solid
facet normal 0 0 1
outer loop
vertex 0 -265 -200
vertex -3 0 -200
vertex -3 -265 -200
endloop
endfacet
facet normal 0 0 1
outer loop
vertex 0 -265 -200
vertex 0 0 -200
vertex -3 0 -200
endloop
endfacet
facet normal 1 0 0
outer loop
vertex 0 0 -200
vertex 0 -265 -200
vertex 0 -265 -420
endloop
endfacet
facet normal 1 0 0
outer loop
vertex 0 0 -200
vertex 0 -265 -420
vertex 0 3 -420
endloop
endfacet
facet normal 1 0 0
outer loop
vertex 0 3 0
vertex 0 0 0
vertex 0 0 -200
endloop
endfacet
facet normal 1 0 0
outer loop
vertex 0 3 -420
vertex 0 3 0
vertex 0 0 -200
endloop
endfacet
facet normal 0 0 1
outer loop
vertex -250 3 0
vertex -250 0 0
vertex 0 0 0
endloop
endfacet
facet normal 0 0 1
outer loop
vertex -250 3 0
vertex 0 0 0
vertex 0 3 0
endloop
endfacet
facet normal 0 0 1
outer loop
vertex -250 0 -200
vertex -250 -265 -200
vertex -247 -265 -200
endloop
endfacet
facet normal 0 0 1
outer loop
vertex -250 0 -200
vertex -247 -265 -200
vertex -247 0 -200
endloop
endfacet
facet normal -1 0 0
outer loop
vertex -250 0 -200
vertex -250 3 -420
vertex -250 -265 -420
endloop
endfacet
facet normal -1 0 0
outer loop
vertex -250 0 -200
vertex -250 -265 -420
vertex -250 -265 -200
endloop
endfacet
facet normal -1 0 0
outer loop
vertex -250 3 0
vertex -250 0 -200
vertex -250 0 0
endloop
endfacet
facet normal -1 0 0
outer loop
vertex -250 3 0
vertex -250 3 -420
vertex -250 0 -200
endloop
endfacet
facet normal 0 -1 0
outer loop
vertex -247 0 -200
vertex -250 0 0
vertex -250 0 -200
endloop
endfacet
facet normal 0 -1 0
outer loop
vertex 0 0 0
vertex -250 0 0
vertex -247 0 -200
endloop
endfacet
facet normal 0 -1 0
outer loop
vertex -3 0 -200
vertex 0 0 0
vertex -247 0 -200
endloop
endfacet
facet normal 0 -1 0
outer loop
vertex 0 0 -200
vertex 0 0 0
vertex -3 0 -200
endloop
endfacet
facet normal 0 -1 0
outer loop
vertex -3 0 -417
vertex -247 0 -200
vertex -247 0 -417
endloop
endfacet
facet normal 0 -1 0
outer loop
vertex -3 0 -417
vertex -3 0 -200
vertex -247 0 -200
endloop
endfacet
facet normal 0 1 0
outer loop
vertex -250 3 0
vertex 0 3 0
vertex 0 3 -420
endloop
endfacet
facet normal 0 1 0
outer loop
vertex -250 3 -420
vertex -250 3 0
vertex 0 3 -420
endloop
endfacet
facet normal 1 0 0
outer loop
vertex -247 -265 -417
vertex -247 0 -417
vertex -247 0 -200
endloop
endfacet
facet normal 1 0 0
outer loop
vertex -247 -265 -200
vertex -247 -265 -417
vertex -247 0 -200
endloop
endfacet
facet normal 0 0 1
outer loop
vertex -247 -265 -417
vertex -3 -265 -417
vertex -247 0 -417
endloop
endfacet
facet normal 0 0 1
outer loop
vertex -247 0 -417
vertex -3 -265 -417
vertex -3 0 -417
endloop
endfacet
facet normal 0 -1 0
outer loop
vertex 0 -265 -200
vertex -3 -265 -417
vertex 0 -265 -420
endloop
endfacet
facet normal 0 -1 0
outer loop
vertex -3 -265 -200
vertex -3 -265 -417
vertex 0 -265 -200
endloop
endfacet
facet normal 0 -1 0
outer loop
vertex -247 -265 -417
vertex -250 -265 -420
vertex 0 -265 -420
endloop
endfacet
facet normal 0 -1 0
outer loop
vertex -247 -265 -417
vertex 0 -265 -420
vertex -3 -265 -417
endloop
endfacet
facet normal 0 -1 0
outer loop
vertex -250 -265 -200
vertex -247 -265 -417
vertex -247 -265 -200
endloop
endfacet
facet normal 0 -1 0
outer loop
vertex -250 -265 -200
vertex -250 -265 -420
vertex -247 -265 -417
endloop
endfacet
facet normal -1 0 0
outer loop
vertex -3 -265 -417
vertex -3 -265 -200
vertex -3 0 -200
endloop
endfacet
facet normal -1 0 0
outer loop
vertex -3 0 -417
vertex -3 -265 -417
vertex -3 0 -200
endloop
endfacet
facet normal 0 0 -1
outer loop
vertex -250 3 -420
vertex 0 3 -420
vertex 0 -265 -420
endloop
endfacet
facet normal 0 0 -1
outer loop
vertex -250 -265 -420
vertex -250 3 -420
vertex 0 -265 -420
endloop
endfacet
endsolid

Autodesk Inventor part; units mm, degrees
ref_plane "YZ Plane" through (0, 0, 0) normal (1, 0, 0) x (0, 1, 0)
ref_plane "XZ Plane" through (0, 0, 0) normal (0, 1, 0) x (-1, 0, 0)
ref_plane "XY Plane" through (0, 0, 0) normal (0, 0, 1) x (1, 0, 0)
sketch "Sketch1" plane through (0, 0, 0) normal (1, 0, 0) x (0, 1, 0)
  line L0 (0, 0) -> (0, -200)
  line L1 (0, 0) -> (200, 0) construction
  line L2 (0, -200) -> (-240, -200)
  line L3 (-240, -420) -> (0, -420)
  line L4 (0, 0) -> (3, 0)
  line L5 (3, 0) -> (3, -420)
  line L6 (3, -420) -> (-1.1181, -420)
  line L7 (0, -200) -> (0, -420)
  line L8 (-240, -417) -> (0, -417)
  line L9 (-240, -417) -> (0, -417) construction
  line L10 (-240, -200) -> (-265, -200)
  line L11 (-265, -200) -> (-265, -420)
  line L12 (-265, -420) -> (-240, -420)
  line L13 (-240, -417) -> (-265, -417)
  dimension "d0" = 200
  dimension "d1" = 90
  dimension "d2" = 240
  dimension "d3" = 90
  dimension "d4" = 220
  dimension "d8" = 3
  dimension "d9" = 90
  dimension "d10" = 3
  dimension "d18" = 25
  dimension "d19" = 220
  dimension "d20" = 90
extrude "Extrusion4" add sketch "Sketch1" against normal blind 250 contours L4 L5 L6 L7 L0 | L7 L3 L12 L11 L13 L8
extrude "Extrusion5" add sketch "Sketch1" against normal blind 3 contours L7 L8 L13 L11 L10 L2
sketch "Sketch3" plane through (-250, 0, 0) normal (-1, 0, 0) x (0, 0, 1)
  line L0 (-417, -265) -> (-417, 0) projected
  line L1 (-200, -265) -> (-200, 0) projected
  line L2 (-417, 0) -> (-200, 0)
  line L3 (-417, -265) -> (-200, -265) projected
  line L4 (-200, 0) -> (-200, -265)
  line L5 (-200, -265) -> (-417, -265)
  point P0 (0, 0)
extrude "Extrusion6" add sketch "Sketch3" against normal blind 3
properties part number "Pump System Cover"
